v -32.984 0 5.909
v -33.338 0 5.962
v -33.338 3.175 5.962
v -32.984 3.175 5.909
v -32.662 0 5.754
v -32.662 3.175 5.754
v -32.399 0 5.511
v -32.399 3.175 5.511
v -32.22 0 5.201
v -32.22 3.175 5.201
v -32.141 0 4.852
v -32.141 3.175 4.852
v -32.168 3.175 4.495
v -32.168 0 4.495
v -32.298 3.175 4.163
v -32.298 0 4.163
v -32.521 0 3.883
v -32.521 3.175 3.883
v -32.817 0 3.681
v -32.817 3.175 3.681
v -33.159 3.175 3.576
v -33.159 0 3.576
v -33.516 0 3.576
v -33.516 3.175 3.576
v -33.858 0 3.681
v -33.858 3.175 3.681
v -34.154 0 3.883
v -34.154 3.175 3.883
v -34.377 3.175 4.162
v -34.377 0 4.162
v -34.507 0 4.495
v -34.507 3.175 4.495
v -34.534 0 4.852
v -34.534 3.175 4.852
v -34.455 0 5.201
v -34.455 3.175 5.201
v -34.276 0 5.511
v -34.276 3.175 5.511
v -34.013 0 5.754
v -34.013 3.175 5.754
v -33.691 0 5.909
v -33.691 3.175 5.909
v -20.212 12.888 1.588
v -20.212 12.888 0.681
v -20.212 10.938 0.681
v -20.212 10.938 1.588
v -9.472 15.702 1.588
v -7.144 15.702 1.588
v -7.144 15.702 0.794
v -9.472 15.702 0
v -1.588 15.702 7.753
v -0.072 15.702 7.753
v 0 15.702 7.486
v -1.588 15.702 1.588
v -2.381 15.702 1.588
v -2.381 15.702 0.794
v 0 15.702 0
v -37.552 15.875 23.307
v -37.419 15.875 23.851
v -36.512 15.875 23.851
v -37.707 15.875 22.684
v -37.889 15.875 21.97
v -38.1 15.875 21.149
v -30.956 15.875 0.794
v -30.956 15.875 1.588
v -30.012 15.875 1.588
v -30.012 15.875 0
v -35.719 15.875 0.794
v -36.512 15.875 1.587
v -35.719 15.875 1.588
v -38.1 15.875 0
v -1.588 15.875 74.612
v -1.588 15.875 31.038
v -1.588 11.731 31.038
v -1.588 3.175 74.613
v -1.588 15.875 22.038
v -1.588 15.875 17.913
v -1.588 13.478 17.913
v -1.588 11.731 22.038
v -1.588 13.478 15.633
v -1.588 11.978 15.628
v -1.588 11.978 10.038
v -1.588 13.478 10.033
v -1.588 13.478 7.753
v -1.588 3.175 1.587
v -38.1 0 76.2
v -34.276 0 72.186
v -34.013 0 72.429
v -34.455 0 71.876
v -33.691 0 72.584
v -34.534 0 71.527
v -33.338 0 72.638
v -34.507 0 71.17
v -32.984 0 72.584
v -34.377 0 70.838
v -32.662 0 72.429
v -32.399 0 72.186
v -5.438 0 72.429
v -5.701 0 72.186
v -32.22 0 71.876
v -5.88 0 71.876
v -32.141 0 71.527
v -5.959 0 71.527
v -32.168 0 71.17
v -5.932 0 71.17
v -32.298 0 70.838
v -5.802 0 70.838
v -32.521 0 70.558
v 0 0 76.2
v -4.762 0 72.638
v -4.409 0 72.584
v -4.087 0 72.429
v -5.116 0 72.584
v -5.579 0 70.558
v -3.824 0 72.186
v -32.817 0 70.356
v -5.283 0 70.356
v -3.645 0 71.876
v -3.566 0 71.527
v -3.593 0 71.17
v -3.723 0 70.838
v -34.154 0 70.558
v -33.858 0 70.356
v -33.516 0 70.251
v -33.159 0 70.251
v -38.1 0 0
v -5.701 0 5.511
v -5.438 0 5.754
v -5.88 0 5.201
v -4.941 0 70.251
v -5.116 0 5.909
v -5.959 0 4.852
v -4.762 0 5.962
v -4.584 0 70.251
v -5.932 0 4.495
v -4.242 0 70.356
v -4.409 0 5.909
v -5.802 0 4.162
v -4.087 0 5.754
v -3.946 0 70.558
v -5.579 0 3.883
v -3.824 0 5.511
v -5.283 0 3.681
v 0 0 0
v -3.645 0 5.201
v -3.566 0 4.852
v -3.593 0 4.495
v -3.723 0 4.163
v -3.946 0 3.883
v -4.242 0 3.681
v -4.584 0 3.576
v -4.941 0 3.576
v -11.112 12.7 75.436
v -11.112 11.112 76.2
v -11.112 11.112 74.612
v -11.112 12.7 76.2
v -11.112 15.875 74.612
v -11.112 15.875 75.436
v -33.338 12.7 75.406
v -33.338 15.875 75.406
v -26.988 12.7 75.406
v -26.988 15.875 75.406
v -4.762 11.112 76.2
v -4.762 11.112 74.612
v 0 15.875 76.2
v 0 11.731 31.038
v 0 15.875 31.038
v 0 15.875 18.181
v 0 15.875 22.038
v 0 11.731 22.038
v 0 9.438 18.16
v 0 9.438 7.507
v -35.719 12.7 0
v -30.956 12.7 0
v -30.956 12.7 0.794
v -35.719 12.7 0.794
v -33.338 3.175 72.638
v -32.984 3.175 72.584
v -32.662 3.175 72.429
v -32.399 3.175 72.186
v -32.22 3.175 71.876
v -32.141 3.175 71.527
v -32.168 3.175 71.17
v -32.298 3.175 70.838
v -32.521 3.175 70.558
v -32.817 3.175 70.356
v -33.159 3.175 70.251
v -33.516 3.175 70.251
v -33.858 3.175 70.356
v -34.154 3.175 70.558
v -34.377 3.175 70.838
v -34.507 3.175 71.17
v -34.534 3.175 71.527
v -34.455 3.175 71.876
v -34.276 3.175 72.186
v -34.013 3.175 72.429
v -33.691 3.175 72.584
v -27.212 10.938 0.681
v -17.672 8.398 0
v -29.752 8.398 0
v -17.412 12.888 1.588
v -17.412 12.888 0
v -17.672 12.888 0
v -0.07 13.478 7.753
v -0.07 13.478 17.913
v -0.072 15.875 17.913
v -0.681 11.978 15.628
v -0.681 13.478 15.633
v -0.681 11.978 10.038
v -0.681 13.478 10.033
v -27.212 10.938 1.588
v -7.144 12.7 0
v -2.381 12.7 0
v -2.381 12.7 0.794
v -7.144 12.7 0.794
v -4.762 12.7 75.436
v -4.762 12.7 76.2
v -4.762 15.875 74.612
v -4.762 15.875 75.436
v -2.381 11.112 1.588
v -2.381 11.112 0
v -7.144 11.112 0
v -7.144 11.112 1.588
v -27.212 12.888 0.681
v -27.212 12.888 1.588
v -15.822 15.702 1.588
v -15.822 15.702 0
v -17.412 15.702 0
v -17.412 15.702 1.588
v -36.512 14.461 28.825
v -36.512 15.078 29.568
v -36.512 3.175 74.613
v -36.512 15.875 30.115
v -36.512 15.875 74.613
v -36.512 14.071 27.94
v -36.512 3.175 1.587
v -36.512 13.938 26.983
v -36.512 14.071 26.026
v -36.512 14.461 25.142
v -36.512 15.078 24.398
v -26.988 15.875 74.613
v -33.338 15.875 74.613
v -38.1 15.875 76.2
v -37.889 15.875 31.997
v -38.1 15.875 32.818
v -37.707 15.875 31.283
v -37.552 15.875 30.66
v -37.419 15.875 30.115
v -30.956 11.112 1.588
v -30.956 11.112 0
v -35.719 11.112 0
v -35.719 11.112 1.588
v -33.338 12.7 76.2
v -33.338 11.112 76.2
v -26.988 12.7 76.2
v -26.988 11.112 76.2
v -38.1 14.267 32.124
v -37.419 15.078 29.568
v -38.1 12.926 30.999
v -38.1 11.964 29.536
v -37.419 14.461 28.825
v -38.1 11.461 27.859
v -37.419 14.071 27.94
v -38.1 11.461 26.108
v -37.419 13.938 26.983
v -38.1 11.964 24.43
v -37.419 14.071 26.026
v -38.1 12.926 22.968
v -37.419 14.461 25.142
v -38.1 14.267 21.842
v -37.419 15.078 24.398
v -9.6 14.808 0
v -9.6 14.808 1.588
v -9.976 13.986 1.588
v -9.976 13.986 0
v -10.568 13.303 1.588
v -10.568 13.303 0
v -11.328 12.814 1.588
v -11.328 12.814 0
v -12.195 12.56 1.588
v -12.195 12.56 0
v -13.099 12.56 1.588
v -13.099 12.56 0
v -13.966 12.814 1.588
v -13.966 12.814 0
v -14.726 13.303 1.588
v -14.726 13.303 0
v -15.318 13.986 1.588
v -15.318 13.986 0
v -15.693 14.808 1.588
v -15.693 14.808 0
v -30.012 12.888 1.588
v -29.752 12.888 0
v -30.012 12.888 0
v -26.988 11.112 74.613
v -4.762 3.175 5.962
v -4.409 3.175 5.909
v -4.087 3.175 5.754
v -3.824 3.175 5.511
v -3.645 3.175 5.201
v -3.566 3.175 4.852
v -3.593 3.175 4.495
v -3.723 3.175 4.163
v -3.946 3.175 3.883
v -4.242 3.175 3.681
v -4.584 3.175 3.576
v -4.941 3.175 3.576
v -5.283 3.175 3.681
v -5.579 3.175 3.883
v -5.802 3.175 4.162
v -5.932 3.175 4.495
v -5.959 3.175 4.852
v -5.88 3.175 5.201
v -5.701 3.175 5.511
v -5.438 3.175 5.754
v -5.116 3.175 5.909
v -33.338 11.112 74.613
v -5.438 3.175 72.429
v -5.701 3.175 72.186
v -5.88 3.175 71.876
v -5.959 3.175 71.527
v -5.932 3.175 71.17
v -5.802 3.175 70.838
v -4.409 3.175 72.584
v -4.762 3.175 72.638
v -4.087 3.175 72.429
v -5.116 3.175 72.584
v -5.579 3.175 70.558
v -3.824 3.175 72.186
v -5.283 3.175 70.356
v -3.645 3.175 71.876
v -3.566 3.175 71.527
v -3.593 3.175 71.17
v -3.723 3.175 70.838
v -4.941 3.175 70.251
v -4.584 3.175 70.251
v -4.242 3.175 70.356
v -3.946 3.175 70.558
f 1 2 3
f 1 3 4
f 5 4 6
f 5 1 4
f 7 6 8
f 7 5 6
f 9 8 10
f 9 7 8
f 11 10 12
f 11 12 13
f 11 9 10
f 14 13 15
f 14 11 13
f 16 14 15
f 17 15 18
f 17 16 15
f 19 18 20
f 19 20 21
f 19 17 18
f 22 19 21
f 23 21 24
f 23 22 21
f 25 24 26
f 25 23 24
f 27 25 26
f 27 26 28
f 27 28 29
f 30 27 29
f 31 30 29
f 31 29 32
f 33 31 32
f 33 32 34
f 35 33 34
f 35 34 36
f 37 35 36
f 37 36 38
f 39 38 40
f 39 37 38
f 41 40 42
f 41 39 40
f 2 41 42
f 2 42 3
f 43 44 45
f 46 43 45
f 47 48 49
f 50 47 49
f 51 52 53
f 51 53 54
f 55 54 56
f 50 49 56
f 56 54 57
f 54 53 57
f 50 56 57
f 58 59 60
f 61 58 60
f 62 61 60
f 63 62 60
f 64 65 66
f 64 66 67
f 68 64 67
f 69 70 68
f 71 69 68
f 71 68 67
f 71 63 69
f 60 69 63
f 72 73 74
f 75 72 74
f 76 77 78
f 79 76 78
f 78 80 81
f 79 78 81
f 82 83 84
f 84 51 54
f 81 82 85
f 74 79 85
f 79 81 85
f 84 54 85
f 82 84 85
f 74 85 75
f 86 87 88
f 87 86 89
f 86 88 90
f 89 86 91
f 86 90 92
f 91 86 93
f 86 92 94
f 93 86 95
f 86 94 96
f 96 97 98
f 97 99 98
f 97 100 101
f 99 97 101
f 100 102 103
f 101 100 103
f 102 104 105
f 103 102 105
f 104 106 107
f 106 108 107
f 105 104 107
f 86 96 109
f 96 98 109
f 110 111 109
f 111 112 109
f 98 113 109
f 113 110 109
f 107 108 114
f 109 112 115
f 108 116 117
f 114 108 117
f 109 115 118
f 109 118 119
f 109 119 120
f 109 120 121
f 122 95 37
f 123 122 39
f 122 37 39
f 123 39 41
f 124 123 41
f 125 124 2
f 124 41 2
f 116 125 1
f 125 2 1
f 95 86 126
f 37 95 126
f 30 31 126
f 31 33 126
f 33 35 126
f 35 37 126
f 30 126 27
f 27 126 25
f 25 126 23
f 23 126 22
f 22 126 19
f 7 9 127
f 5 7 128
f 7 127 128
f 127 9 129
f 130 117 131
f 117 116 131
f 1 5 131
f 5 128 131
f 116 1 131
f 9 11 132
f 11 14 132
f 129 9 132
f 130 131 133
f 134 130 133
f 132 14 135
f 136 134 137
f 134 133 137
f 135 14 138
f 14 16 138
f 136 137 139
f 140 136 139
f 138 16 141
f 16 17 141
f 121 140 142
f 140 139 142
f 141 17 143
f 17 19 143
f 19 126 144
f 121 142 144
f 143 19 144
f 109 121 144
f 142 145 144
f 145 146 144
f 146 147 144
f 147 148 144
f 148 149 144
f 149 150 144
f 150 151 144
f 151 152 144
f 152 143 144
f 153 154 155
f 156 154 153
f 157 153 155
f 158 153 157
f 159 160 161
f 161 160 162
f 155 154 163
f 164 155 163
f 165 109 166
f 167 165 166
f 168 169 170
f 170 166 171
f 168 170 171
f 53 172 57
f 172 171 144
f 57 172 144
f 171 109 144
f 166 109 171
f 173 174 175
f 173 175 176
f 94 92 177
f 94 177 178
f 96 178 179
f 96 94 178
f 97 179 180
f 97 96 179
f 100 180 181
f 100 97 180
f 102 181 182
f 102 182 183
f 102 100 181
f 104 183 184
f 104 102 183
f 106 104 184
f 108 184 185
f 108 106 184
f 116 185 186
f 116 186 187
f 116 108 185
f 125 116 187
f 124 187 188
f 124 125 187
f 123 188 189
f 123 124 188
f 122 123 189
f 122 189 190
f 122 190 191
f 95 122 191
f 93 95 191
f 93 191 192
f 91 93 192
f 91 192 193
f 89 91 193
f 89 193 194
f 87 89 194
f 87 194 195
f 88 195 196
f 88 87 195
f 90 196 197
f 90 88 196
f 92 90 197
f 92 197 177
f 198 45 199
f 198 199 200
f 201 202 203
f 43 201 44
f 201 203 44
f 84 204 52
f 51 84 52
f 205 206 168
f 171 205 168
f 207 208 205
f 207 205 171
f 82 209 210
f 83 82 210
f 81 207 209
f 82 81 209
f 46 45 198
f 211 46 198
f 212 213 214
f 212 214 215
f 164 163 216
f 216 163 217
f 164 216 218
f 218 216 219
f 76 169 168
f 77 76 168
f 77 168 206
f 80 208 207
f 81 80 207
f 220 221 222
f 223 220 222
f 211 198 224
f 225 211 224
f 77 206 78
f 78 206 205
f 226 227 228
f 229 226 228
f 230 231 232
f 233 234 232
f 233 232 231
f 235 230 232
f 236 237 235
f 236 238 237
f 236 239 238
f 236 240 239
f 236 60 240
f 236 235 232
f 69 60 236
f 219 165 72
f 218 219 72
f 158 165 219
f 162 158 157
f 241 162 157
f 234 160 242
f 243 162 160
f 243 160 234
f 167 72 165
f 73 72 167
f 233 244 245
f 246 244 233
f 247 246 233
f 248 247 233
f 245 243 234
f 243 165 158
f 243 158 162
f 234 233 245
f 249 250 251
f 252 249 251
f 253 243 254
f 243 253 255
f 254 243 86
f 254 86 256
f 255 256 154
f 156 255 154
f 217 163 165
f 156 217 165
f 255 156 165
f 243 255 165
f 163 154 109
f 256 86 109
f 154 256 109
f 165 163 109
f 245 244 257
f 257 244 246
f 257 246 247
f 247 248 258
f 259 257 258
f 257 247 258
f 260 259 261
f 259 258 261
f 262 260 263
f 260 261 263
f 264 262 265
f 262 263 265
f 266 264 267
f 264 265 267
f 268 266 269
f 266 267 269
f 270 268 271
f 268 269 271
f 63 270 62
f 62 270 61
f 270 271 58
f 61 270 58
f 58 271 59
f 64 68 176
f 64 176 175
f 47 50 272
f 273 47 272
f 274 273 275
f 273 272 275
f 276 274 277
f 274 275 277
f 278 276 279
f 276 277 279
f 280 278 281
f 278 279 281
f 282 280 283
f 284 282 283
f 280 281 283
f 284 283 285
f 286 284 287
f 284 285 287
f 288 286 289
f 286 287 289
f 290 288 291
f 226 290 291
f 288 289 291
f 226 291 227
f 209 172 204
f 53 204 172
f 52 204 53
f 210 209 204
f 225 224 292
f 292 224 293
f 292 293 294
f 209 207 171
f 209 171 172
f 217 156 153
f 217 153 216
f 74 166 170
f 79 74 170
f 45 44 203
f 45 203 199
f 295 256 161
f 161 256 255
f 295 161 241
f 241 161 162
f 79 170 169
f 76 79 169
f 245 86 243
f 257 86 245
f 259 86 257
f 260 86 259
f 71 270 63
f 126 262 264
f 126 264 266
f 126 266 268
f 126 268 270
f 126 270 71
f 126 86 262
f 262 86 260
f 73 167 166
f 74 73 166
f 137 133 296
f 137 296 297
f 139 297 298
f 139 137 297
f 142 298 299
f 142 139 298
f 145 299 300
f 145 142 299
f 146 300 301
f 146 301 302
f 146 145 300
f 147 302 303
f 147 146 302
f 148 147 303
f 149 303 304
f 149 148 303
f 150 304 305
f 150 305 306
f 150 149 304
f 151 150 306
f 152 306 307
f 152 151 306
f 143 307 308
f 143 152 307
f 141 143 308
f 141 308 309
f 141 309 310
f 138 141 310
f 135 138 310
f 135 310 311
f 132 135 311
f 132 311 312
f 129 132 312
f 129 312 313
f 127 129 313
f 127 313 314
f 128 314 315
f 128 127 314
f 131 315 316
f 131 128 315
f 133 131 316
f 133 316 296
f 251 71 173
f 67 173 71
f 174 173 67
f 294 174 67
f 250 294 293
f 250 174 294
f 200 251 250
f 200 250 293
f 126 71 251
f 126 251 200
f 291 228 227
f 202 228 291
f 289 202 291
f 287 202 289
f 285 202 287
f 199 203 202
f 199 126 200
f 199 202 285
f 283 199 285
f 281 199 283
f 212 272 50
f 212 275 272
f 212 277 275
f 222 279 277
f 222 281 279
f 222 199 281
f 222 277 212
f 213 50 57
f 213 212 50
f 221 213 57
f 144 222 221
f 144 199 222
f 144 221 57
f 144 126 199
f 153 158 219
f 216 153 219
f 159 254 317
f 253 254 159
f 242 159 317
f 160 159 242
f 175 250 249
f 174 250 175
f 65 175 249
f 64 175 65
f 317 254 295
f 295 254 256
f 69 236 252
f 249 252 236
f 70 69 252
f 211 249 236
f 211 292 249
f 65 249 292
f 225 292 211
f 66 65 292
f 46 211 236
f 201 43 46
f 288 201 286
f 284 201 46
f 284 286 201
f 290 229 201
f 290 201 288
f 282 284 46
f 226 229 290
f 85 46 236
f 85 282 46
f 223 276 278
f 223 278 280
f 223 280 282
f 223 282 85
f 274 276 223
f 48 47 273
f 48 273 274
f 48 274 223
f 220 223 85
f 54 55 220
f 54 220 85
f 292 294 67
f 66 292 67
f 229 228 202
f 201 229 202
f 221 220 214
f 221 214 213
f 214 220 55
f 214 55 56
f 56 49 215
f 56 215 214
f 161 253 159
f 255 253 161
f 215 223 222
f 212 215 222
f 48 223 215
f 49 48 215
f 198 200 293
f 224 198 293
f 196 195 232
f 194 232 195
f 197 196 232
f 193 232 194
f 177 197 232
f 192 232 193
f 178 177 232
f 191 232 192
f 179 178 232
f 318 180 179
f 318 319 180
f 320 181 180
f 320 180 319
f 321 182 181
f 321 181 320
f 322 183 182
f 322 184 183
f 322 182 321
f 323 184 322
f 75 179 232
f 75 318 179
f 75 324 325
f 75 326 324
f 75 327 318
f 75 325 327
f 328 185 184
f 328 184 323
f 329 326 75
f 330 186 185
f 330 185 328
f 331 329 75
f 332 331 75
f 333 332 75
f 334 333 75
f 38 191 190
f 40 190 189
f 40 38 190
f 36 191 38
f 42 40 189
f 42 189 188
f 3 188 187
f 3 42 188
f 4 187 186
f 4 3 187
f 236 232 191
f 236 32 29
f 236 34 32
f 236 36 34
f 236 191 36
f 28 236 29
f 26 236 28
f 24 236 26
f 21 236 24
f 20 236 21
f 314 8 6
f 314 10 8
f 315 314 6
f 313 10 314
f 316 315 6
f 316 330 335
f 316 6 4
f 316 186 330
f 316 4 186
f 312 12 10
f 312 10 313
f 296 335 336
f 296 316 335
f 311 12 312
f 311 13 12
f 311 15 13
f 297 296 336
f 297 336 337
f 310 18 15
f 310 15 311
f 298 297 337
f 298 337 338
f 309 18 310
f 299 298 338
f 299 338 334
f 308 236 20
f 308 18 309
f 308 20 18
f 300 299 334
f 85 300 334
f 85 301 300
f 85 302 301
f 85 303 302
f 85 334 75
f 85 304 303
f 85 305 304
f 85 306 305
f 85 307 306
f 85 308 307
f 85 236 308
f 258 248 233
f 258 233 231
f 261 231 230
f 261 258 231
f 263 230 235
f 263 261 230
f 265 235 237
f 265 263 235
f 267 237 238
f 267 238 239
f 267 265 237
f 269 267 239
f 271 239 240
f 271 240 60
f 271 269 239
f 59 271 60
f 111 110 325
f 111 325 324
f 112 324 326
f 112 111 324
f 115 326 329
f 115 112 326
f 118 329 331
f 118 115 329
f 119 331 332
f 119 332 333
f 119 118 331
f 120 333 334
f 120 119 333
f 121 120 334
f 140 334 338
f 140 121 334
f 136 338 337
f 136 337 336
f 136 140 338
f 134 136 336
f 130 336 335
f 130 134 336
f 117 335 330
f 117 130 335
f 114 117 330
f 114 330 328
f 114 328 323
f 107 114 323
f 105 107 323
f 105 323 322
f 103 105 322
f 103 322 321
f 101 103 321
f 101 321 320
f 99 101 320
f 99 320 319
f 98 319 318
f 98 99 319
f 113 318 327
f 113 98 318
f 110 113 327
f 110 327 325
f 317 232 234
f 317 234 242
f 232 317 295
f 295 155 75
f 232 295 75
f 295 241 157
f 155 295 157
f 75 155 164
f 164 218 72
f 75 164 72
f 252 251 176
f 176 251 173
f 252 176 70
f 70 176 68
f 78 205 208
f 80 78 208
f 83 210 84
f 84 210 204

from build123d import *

# Parameters (mm, degrees)
SKETCH1_W           = 38.1
SKETCH1_H           = 76.2
BOSS_EXTRUDE1_DEPTH = 25.4
SKETCH2_R           = 1.2
CUT_EXTRUDE1_DEPTH  = 3.175
SKETCH4_W           = 34.925
SKETCH4_H           = 73.025
CUT_EXTRUDE2_DEPTH  = 22.225
CUT_EXTRUDE3_DEPTH  = 1.5875
CUT_EXTRUDE4_DEPTH  = 1.5875
SKETCH7_W           = 34.925
SKETCH7_H           = 9.525
CUT_EXTRUDE5_DEPTH  = 1.5875
CUT_EXTRUDE6_DEPTH  = 1.5875
CHAMFER1_SIZE       = 2.54
CHAMFER1_SIZE2      = 0.680590949
CHAMFER3_SIZE       = 2.54
CHAMFER3_SIZE2      = 0.680590949
CHAMFER4_SIZE       = 2.54
CHAMFER4_SIZE2      = 0.680590949
SKETCH10_W          = 6.35
SKETCH10_H          = 0.79375
SKETCH10_W_2        = 4.7625
SKETCH10_H_2        = 0.823022406
CUT_EXTRUDE7_DEPTH  = 4.7625
CUT_EXTRUDE8_REACH  = 88.661
SKETCH11_W          = 6.35
SKETCH11_H          = 1.5875
SKETCH14_W          = 4.7625
SKETCH14_H          = 1.5875
CUT_EXTRUDE9_DEPTH  = 1.5875


with BuildPart() as part:
    # Sketch1 → Boss-Extrude1 (new body)
    with BuildSketch(Plane(origin=(0, 0, 0), x_dir=(1, 0, 0), z_dir=(0, 1, 0))):
        with Locations((-19.05, -38.1)):
            Rectangle(SKETCH1_W, SKETCH1_H)
    extrude(amount=BOSS_EXTRUDE1_DEPTH)

    # Sketch2 → Cut-Extrude1 (cut)
    with BuildSketch(Plane(origin=(0, 0, 0), x_dir=(1, 0, 0), z_dir=(0, 1, 0))):
        with Locations(Location((-33.3375, -4.7625, 0), (0, 0, 270))):
            Circle(SKETCH2_R)
        with Locations(Location((-4.7625, -4.7625, 0), (0, 0, 270))):
            Circle(SKETCH2_R)
        with Locations(Location((-33.3375, -71.4375, 0), (0, 0, 270))):
            Circle(SKETCH2_R)
        with Locations(Location((-4.7625, -71.4375, 0), (0, 0, 270))):
            Circle(SKETCH2_R)
    extrude(amount=CUT_EXTRUDE1_DEPTH, mode=Mode.SUBTRACT)

    # Sketch4 → Cut-Extrude2 (cut)
    with BuildSketch(Plane(origin=(0, 25.4, 0), x_dir=(1, 0, 0), z_dir=(0, 1, 0))):
        with Locations((-19.05, -38.1)):
            Rectangle(SKETCH4_W, SKETCH4_H)
    extrude(amount=-CUT_EXTRUDE2_DEPTH, mode=Mode.SUBTRACT)

    # Sketch5 → Cut-Extrude3 (cut)
    with BuildSketch(Plane.ZY.offset(38.1)):
        with BuildLine():
            Line((76.2, 15.875), (30.115167454, 15.875))
            ThreePointArc((30.115167454, 15.875), (26.9833, 13.9375), (23.851432546, 15.875))
            Line((23.851432546, 15.875), (0, 15.875))
            Line((0, 15.875), (0, 25.4))
            Line((0, 25.4), (76.2, 25.4))
            Line((76.2, 25.4), (76.2, 15.875))
        make_face()
    extrude(amount=-CUT_EXTRUDE3_DEPTH, mode=Mode.SUBTRACT)

    # Sketch6 → Cut-Extrude4 (cut)
    with BuildSketch(Plane(origin=(0, 0, 0), x_dir=(-1, 0, 0), z_dir=(0, 0, -1))):
        with BuildLine():
            Line((30.0117, 12.8875), (30.0117, 15.875))
            Line((30.0117, 15.875), (36.5125, 15.875))
            Line((36.5125, 15.875), (36.5125, 25.4))
            Line((36.5125, 25.4), (1.5875, 25.4))
            Line((1.5875, 25.4), (1.5875, 15.7025))
            Line((1.5875, 15.7025), (9.4717, 15.7025))
            ThreePointArc((9.4717, 15.7025), (12.6467, 12.5275), (15.8217, 15.7025))
            Line((15.8217, 15.7025), (17.4117, 15.7025))
            Line((17.4117, 15.7025), (17.4117, 12.8875))
            Line((17.4117, 12.8875), (20.2117, 12.8875))
            Line((20.2117, 12.8875), (20.2117, 10.9375))
            Line((20.2117, 10.9375), (27.2117, 10.9375))
            Line((27.2117, 10.9375), (27.2117, 12.8875))
            Line((27.2117, 12.8875), (30.0117, 12.8875))
        make_face()
    extrude(amount=-CUT_EXTRUDE4_DEPTH, mode=Mode.SUBTRACT)

    # Sketch7 → Cut-Extrude5 (cut)
    with BuildSketch(Plane.XY.offset(76.2)):
        with Locations((-19.05, 20.6375)):
            Rectangle(SKETCH7_W, SKETCH7_H)
    extrude(amount=-CUT_EXTRUDE5_DEPTH, mode=Mode.SUBTRACT)

    # Sketch8 → Cut-Extrude6 (cut)
    with BuildSketch(Plane(origin=(0, 0, 0), x_dir=(0, 0, -1), z_dir=(1, 0, 0))):
        Polygon((-76.2, 25.4), (-76.2, 15.875), (-31.0375, 15.875), (-31.0375, 11.73125), (-22.0375, 11.73125), (-22.0375, 15.875), (-17.913122854, 15.875), (-17.913122854, 13.4775), (-15.633122854, 13.4775), (-15.628122854, 11.9775), (-10.038122854, 11.9775), (-10.033122854, 13.4775), (-7.753122854, 13.4775), (-7.753122854, 15.7025), (0, 15.7025), (0, 15.875), (0, 25.4), align=None)
    extrude(amount=-CUT_EXTRUDE6_DEPTH, mode=Mode.SUBTRACT)

    # Chamfer1
    chamfer1_edges = [part.edges().sort_by_distance(p)[0] for p in [
        (-38.1, 13.9375, 26.9833),
    ]]
    chamfer1_side = [part.faces().sort_by_distance(p)[0] for p in [
        (-38.1, 7.88589412, 38.18034211),
    ]]
    chamfer(chamfer1_edges, length=CHAMFER1_SIZE, length2=CHAMFER1_SIZE2, reference=chamfer1_side[0])

    # Chamfer3
    chamfer3_edges = [part.edges().sort_by_distance(p)[0] for p in [
        (-20.2117, 11.9125, 0),
        (-23.7117, 10.9375, 0),
        (-27.2117, 11.9125, 0),
    ]]
    chamfer3_side = [part.faces().sort_by_distance(p)[0] for p in [
        (-18.850549312, 7.148250007, 0),
    ]]
    chamfer(chamfer3_edges, length=CHAMFER3_SIZE, length2=CHAMFER3_SIZE2, reference=chamfer3_side[0])

    # Chamfer4
    chamfer4_edges = [part.edges().sort_by_distance(p)[0] for p in [
        (0, 12.7275, 10.035622854),
        (0, 12.7275, 15.630622854),
        (0, 11.9775, 12.833122854),
    ]]
    chamfer4_side = [part.faces().sort_by_distance(p)[0] for p in [
        (0, 7.556578666, 39.246012672),
    ]]
    chamfer(chamfer4_edges, length=CHAMFER4_SIZE, length2=CHAMFER4_SIZE2, reference=chamfer4_side[0])

    # Sketch10 → Cut-Extrude7 (cut)
    with BuildSketch(Plane(origin=(0, 15.875, 0), x_dir=(1, 0, 0), z_dir=(0, 1, 0))):
        with Locations((-30.1625, -75.009375)):
            Rectangle(SKETCH10_W, SKETCH10_H)
        with Locations((-33.3375, -1.190625)):
            Rectangle(SKETCH10_W_2, SKETCH10_H)
        with Locations((-4.7625, -1.190625)):
            Rectangle(SKETCH10_W_2, SKETCH10_H)
        with Locations((-7.9375, -75.024011203)):
            Rectangle(SKETCH10_W, SKETCH10_H_2)
    extrude(amount=-CUT_EXTRUDE7_DEPTH, mode=Mode.SUBTRACT)

    # Sketch11 → Cut-Extrude8 (cut, up to next)
    with BuildSketch(Plane.XY.offset(76.2), mode=Mode.PRIVATE) as cut_extrude8_sk1:
        with Locations((-30.1625, 11.90625)):
            Rectangle(SKETCH11_W, SKETCH11_H)
    cut_extrude8_tool1 = extrude(cut_extrude8_sk1.sketch, amount=-CUT_EXTRUDE8_REACH, mode=Mode.PRIVATE) & part.part
    # Sketch11 → Cut-Extrude8 (cut, up to next)
    with BuildSketch(Plane.XY.offset(76.2), mode=Mode.PRIVATE) as cut_extrude8_sk2:
        with Locations((-7.9375, 11.90625)):
            Rectangle(SKETCH11_W, SKETCH11_H)
    cut_extrude8_tool2 = extrude(cut_extrude8_sk2.sketch, amount=-CUT_EXTRUDE8_REACH, mode=Mode.PRIVATE) & part.part
    add(cut_extrude8_tool1.solids().sort_by_distance((-30.1625, 11.90625, 76.2))[0], mode=Mode.SUBTRACT)
    add(cut_extrude8_tool2.solids().sort_by_distance((-7.9375, 11.90625, 76.2))[0], mode=Mode.SUBTRACT)

    # Sketch14 → Cut-Extrude9 (cut)
    with BuildSketch(Plane(origin=(0, 0, 0), x_dir=(-1, 0, 0), z_dir=(0, 0, -1))):
        with Locations((33.3375, 11.90625)):
            Rectangle(SKETCH14_W, SKETCH14_H)
        with Locations((4.7625, 11.90625)):
            Rectangle(SKETCH14_W, SKETCH14_H)
    extrude(amount=-CUT_EXTRUDE9_DEPTH, mode=Mode.SUBTRACT)


solid = part.part
